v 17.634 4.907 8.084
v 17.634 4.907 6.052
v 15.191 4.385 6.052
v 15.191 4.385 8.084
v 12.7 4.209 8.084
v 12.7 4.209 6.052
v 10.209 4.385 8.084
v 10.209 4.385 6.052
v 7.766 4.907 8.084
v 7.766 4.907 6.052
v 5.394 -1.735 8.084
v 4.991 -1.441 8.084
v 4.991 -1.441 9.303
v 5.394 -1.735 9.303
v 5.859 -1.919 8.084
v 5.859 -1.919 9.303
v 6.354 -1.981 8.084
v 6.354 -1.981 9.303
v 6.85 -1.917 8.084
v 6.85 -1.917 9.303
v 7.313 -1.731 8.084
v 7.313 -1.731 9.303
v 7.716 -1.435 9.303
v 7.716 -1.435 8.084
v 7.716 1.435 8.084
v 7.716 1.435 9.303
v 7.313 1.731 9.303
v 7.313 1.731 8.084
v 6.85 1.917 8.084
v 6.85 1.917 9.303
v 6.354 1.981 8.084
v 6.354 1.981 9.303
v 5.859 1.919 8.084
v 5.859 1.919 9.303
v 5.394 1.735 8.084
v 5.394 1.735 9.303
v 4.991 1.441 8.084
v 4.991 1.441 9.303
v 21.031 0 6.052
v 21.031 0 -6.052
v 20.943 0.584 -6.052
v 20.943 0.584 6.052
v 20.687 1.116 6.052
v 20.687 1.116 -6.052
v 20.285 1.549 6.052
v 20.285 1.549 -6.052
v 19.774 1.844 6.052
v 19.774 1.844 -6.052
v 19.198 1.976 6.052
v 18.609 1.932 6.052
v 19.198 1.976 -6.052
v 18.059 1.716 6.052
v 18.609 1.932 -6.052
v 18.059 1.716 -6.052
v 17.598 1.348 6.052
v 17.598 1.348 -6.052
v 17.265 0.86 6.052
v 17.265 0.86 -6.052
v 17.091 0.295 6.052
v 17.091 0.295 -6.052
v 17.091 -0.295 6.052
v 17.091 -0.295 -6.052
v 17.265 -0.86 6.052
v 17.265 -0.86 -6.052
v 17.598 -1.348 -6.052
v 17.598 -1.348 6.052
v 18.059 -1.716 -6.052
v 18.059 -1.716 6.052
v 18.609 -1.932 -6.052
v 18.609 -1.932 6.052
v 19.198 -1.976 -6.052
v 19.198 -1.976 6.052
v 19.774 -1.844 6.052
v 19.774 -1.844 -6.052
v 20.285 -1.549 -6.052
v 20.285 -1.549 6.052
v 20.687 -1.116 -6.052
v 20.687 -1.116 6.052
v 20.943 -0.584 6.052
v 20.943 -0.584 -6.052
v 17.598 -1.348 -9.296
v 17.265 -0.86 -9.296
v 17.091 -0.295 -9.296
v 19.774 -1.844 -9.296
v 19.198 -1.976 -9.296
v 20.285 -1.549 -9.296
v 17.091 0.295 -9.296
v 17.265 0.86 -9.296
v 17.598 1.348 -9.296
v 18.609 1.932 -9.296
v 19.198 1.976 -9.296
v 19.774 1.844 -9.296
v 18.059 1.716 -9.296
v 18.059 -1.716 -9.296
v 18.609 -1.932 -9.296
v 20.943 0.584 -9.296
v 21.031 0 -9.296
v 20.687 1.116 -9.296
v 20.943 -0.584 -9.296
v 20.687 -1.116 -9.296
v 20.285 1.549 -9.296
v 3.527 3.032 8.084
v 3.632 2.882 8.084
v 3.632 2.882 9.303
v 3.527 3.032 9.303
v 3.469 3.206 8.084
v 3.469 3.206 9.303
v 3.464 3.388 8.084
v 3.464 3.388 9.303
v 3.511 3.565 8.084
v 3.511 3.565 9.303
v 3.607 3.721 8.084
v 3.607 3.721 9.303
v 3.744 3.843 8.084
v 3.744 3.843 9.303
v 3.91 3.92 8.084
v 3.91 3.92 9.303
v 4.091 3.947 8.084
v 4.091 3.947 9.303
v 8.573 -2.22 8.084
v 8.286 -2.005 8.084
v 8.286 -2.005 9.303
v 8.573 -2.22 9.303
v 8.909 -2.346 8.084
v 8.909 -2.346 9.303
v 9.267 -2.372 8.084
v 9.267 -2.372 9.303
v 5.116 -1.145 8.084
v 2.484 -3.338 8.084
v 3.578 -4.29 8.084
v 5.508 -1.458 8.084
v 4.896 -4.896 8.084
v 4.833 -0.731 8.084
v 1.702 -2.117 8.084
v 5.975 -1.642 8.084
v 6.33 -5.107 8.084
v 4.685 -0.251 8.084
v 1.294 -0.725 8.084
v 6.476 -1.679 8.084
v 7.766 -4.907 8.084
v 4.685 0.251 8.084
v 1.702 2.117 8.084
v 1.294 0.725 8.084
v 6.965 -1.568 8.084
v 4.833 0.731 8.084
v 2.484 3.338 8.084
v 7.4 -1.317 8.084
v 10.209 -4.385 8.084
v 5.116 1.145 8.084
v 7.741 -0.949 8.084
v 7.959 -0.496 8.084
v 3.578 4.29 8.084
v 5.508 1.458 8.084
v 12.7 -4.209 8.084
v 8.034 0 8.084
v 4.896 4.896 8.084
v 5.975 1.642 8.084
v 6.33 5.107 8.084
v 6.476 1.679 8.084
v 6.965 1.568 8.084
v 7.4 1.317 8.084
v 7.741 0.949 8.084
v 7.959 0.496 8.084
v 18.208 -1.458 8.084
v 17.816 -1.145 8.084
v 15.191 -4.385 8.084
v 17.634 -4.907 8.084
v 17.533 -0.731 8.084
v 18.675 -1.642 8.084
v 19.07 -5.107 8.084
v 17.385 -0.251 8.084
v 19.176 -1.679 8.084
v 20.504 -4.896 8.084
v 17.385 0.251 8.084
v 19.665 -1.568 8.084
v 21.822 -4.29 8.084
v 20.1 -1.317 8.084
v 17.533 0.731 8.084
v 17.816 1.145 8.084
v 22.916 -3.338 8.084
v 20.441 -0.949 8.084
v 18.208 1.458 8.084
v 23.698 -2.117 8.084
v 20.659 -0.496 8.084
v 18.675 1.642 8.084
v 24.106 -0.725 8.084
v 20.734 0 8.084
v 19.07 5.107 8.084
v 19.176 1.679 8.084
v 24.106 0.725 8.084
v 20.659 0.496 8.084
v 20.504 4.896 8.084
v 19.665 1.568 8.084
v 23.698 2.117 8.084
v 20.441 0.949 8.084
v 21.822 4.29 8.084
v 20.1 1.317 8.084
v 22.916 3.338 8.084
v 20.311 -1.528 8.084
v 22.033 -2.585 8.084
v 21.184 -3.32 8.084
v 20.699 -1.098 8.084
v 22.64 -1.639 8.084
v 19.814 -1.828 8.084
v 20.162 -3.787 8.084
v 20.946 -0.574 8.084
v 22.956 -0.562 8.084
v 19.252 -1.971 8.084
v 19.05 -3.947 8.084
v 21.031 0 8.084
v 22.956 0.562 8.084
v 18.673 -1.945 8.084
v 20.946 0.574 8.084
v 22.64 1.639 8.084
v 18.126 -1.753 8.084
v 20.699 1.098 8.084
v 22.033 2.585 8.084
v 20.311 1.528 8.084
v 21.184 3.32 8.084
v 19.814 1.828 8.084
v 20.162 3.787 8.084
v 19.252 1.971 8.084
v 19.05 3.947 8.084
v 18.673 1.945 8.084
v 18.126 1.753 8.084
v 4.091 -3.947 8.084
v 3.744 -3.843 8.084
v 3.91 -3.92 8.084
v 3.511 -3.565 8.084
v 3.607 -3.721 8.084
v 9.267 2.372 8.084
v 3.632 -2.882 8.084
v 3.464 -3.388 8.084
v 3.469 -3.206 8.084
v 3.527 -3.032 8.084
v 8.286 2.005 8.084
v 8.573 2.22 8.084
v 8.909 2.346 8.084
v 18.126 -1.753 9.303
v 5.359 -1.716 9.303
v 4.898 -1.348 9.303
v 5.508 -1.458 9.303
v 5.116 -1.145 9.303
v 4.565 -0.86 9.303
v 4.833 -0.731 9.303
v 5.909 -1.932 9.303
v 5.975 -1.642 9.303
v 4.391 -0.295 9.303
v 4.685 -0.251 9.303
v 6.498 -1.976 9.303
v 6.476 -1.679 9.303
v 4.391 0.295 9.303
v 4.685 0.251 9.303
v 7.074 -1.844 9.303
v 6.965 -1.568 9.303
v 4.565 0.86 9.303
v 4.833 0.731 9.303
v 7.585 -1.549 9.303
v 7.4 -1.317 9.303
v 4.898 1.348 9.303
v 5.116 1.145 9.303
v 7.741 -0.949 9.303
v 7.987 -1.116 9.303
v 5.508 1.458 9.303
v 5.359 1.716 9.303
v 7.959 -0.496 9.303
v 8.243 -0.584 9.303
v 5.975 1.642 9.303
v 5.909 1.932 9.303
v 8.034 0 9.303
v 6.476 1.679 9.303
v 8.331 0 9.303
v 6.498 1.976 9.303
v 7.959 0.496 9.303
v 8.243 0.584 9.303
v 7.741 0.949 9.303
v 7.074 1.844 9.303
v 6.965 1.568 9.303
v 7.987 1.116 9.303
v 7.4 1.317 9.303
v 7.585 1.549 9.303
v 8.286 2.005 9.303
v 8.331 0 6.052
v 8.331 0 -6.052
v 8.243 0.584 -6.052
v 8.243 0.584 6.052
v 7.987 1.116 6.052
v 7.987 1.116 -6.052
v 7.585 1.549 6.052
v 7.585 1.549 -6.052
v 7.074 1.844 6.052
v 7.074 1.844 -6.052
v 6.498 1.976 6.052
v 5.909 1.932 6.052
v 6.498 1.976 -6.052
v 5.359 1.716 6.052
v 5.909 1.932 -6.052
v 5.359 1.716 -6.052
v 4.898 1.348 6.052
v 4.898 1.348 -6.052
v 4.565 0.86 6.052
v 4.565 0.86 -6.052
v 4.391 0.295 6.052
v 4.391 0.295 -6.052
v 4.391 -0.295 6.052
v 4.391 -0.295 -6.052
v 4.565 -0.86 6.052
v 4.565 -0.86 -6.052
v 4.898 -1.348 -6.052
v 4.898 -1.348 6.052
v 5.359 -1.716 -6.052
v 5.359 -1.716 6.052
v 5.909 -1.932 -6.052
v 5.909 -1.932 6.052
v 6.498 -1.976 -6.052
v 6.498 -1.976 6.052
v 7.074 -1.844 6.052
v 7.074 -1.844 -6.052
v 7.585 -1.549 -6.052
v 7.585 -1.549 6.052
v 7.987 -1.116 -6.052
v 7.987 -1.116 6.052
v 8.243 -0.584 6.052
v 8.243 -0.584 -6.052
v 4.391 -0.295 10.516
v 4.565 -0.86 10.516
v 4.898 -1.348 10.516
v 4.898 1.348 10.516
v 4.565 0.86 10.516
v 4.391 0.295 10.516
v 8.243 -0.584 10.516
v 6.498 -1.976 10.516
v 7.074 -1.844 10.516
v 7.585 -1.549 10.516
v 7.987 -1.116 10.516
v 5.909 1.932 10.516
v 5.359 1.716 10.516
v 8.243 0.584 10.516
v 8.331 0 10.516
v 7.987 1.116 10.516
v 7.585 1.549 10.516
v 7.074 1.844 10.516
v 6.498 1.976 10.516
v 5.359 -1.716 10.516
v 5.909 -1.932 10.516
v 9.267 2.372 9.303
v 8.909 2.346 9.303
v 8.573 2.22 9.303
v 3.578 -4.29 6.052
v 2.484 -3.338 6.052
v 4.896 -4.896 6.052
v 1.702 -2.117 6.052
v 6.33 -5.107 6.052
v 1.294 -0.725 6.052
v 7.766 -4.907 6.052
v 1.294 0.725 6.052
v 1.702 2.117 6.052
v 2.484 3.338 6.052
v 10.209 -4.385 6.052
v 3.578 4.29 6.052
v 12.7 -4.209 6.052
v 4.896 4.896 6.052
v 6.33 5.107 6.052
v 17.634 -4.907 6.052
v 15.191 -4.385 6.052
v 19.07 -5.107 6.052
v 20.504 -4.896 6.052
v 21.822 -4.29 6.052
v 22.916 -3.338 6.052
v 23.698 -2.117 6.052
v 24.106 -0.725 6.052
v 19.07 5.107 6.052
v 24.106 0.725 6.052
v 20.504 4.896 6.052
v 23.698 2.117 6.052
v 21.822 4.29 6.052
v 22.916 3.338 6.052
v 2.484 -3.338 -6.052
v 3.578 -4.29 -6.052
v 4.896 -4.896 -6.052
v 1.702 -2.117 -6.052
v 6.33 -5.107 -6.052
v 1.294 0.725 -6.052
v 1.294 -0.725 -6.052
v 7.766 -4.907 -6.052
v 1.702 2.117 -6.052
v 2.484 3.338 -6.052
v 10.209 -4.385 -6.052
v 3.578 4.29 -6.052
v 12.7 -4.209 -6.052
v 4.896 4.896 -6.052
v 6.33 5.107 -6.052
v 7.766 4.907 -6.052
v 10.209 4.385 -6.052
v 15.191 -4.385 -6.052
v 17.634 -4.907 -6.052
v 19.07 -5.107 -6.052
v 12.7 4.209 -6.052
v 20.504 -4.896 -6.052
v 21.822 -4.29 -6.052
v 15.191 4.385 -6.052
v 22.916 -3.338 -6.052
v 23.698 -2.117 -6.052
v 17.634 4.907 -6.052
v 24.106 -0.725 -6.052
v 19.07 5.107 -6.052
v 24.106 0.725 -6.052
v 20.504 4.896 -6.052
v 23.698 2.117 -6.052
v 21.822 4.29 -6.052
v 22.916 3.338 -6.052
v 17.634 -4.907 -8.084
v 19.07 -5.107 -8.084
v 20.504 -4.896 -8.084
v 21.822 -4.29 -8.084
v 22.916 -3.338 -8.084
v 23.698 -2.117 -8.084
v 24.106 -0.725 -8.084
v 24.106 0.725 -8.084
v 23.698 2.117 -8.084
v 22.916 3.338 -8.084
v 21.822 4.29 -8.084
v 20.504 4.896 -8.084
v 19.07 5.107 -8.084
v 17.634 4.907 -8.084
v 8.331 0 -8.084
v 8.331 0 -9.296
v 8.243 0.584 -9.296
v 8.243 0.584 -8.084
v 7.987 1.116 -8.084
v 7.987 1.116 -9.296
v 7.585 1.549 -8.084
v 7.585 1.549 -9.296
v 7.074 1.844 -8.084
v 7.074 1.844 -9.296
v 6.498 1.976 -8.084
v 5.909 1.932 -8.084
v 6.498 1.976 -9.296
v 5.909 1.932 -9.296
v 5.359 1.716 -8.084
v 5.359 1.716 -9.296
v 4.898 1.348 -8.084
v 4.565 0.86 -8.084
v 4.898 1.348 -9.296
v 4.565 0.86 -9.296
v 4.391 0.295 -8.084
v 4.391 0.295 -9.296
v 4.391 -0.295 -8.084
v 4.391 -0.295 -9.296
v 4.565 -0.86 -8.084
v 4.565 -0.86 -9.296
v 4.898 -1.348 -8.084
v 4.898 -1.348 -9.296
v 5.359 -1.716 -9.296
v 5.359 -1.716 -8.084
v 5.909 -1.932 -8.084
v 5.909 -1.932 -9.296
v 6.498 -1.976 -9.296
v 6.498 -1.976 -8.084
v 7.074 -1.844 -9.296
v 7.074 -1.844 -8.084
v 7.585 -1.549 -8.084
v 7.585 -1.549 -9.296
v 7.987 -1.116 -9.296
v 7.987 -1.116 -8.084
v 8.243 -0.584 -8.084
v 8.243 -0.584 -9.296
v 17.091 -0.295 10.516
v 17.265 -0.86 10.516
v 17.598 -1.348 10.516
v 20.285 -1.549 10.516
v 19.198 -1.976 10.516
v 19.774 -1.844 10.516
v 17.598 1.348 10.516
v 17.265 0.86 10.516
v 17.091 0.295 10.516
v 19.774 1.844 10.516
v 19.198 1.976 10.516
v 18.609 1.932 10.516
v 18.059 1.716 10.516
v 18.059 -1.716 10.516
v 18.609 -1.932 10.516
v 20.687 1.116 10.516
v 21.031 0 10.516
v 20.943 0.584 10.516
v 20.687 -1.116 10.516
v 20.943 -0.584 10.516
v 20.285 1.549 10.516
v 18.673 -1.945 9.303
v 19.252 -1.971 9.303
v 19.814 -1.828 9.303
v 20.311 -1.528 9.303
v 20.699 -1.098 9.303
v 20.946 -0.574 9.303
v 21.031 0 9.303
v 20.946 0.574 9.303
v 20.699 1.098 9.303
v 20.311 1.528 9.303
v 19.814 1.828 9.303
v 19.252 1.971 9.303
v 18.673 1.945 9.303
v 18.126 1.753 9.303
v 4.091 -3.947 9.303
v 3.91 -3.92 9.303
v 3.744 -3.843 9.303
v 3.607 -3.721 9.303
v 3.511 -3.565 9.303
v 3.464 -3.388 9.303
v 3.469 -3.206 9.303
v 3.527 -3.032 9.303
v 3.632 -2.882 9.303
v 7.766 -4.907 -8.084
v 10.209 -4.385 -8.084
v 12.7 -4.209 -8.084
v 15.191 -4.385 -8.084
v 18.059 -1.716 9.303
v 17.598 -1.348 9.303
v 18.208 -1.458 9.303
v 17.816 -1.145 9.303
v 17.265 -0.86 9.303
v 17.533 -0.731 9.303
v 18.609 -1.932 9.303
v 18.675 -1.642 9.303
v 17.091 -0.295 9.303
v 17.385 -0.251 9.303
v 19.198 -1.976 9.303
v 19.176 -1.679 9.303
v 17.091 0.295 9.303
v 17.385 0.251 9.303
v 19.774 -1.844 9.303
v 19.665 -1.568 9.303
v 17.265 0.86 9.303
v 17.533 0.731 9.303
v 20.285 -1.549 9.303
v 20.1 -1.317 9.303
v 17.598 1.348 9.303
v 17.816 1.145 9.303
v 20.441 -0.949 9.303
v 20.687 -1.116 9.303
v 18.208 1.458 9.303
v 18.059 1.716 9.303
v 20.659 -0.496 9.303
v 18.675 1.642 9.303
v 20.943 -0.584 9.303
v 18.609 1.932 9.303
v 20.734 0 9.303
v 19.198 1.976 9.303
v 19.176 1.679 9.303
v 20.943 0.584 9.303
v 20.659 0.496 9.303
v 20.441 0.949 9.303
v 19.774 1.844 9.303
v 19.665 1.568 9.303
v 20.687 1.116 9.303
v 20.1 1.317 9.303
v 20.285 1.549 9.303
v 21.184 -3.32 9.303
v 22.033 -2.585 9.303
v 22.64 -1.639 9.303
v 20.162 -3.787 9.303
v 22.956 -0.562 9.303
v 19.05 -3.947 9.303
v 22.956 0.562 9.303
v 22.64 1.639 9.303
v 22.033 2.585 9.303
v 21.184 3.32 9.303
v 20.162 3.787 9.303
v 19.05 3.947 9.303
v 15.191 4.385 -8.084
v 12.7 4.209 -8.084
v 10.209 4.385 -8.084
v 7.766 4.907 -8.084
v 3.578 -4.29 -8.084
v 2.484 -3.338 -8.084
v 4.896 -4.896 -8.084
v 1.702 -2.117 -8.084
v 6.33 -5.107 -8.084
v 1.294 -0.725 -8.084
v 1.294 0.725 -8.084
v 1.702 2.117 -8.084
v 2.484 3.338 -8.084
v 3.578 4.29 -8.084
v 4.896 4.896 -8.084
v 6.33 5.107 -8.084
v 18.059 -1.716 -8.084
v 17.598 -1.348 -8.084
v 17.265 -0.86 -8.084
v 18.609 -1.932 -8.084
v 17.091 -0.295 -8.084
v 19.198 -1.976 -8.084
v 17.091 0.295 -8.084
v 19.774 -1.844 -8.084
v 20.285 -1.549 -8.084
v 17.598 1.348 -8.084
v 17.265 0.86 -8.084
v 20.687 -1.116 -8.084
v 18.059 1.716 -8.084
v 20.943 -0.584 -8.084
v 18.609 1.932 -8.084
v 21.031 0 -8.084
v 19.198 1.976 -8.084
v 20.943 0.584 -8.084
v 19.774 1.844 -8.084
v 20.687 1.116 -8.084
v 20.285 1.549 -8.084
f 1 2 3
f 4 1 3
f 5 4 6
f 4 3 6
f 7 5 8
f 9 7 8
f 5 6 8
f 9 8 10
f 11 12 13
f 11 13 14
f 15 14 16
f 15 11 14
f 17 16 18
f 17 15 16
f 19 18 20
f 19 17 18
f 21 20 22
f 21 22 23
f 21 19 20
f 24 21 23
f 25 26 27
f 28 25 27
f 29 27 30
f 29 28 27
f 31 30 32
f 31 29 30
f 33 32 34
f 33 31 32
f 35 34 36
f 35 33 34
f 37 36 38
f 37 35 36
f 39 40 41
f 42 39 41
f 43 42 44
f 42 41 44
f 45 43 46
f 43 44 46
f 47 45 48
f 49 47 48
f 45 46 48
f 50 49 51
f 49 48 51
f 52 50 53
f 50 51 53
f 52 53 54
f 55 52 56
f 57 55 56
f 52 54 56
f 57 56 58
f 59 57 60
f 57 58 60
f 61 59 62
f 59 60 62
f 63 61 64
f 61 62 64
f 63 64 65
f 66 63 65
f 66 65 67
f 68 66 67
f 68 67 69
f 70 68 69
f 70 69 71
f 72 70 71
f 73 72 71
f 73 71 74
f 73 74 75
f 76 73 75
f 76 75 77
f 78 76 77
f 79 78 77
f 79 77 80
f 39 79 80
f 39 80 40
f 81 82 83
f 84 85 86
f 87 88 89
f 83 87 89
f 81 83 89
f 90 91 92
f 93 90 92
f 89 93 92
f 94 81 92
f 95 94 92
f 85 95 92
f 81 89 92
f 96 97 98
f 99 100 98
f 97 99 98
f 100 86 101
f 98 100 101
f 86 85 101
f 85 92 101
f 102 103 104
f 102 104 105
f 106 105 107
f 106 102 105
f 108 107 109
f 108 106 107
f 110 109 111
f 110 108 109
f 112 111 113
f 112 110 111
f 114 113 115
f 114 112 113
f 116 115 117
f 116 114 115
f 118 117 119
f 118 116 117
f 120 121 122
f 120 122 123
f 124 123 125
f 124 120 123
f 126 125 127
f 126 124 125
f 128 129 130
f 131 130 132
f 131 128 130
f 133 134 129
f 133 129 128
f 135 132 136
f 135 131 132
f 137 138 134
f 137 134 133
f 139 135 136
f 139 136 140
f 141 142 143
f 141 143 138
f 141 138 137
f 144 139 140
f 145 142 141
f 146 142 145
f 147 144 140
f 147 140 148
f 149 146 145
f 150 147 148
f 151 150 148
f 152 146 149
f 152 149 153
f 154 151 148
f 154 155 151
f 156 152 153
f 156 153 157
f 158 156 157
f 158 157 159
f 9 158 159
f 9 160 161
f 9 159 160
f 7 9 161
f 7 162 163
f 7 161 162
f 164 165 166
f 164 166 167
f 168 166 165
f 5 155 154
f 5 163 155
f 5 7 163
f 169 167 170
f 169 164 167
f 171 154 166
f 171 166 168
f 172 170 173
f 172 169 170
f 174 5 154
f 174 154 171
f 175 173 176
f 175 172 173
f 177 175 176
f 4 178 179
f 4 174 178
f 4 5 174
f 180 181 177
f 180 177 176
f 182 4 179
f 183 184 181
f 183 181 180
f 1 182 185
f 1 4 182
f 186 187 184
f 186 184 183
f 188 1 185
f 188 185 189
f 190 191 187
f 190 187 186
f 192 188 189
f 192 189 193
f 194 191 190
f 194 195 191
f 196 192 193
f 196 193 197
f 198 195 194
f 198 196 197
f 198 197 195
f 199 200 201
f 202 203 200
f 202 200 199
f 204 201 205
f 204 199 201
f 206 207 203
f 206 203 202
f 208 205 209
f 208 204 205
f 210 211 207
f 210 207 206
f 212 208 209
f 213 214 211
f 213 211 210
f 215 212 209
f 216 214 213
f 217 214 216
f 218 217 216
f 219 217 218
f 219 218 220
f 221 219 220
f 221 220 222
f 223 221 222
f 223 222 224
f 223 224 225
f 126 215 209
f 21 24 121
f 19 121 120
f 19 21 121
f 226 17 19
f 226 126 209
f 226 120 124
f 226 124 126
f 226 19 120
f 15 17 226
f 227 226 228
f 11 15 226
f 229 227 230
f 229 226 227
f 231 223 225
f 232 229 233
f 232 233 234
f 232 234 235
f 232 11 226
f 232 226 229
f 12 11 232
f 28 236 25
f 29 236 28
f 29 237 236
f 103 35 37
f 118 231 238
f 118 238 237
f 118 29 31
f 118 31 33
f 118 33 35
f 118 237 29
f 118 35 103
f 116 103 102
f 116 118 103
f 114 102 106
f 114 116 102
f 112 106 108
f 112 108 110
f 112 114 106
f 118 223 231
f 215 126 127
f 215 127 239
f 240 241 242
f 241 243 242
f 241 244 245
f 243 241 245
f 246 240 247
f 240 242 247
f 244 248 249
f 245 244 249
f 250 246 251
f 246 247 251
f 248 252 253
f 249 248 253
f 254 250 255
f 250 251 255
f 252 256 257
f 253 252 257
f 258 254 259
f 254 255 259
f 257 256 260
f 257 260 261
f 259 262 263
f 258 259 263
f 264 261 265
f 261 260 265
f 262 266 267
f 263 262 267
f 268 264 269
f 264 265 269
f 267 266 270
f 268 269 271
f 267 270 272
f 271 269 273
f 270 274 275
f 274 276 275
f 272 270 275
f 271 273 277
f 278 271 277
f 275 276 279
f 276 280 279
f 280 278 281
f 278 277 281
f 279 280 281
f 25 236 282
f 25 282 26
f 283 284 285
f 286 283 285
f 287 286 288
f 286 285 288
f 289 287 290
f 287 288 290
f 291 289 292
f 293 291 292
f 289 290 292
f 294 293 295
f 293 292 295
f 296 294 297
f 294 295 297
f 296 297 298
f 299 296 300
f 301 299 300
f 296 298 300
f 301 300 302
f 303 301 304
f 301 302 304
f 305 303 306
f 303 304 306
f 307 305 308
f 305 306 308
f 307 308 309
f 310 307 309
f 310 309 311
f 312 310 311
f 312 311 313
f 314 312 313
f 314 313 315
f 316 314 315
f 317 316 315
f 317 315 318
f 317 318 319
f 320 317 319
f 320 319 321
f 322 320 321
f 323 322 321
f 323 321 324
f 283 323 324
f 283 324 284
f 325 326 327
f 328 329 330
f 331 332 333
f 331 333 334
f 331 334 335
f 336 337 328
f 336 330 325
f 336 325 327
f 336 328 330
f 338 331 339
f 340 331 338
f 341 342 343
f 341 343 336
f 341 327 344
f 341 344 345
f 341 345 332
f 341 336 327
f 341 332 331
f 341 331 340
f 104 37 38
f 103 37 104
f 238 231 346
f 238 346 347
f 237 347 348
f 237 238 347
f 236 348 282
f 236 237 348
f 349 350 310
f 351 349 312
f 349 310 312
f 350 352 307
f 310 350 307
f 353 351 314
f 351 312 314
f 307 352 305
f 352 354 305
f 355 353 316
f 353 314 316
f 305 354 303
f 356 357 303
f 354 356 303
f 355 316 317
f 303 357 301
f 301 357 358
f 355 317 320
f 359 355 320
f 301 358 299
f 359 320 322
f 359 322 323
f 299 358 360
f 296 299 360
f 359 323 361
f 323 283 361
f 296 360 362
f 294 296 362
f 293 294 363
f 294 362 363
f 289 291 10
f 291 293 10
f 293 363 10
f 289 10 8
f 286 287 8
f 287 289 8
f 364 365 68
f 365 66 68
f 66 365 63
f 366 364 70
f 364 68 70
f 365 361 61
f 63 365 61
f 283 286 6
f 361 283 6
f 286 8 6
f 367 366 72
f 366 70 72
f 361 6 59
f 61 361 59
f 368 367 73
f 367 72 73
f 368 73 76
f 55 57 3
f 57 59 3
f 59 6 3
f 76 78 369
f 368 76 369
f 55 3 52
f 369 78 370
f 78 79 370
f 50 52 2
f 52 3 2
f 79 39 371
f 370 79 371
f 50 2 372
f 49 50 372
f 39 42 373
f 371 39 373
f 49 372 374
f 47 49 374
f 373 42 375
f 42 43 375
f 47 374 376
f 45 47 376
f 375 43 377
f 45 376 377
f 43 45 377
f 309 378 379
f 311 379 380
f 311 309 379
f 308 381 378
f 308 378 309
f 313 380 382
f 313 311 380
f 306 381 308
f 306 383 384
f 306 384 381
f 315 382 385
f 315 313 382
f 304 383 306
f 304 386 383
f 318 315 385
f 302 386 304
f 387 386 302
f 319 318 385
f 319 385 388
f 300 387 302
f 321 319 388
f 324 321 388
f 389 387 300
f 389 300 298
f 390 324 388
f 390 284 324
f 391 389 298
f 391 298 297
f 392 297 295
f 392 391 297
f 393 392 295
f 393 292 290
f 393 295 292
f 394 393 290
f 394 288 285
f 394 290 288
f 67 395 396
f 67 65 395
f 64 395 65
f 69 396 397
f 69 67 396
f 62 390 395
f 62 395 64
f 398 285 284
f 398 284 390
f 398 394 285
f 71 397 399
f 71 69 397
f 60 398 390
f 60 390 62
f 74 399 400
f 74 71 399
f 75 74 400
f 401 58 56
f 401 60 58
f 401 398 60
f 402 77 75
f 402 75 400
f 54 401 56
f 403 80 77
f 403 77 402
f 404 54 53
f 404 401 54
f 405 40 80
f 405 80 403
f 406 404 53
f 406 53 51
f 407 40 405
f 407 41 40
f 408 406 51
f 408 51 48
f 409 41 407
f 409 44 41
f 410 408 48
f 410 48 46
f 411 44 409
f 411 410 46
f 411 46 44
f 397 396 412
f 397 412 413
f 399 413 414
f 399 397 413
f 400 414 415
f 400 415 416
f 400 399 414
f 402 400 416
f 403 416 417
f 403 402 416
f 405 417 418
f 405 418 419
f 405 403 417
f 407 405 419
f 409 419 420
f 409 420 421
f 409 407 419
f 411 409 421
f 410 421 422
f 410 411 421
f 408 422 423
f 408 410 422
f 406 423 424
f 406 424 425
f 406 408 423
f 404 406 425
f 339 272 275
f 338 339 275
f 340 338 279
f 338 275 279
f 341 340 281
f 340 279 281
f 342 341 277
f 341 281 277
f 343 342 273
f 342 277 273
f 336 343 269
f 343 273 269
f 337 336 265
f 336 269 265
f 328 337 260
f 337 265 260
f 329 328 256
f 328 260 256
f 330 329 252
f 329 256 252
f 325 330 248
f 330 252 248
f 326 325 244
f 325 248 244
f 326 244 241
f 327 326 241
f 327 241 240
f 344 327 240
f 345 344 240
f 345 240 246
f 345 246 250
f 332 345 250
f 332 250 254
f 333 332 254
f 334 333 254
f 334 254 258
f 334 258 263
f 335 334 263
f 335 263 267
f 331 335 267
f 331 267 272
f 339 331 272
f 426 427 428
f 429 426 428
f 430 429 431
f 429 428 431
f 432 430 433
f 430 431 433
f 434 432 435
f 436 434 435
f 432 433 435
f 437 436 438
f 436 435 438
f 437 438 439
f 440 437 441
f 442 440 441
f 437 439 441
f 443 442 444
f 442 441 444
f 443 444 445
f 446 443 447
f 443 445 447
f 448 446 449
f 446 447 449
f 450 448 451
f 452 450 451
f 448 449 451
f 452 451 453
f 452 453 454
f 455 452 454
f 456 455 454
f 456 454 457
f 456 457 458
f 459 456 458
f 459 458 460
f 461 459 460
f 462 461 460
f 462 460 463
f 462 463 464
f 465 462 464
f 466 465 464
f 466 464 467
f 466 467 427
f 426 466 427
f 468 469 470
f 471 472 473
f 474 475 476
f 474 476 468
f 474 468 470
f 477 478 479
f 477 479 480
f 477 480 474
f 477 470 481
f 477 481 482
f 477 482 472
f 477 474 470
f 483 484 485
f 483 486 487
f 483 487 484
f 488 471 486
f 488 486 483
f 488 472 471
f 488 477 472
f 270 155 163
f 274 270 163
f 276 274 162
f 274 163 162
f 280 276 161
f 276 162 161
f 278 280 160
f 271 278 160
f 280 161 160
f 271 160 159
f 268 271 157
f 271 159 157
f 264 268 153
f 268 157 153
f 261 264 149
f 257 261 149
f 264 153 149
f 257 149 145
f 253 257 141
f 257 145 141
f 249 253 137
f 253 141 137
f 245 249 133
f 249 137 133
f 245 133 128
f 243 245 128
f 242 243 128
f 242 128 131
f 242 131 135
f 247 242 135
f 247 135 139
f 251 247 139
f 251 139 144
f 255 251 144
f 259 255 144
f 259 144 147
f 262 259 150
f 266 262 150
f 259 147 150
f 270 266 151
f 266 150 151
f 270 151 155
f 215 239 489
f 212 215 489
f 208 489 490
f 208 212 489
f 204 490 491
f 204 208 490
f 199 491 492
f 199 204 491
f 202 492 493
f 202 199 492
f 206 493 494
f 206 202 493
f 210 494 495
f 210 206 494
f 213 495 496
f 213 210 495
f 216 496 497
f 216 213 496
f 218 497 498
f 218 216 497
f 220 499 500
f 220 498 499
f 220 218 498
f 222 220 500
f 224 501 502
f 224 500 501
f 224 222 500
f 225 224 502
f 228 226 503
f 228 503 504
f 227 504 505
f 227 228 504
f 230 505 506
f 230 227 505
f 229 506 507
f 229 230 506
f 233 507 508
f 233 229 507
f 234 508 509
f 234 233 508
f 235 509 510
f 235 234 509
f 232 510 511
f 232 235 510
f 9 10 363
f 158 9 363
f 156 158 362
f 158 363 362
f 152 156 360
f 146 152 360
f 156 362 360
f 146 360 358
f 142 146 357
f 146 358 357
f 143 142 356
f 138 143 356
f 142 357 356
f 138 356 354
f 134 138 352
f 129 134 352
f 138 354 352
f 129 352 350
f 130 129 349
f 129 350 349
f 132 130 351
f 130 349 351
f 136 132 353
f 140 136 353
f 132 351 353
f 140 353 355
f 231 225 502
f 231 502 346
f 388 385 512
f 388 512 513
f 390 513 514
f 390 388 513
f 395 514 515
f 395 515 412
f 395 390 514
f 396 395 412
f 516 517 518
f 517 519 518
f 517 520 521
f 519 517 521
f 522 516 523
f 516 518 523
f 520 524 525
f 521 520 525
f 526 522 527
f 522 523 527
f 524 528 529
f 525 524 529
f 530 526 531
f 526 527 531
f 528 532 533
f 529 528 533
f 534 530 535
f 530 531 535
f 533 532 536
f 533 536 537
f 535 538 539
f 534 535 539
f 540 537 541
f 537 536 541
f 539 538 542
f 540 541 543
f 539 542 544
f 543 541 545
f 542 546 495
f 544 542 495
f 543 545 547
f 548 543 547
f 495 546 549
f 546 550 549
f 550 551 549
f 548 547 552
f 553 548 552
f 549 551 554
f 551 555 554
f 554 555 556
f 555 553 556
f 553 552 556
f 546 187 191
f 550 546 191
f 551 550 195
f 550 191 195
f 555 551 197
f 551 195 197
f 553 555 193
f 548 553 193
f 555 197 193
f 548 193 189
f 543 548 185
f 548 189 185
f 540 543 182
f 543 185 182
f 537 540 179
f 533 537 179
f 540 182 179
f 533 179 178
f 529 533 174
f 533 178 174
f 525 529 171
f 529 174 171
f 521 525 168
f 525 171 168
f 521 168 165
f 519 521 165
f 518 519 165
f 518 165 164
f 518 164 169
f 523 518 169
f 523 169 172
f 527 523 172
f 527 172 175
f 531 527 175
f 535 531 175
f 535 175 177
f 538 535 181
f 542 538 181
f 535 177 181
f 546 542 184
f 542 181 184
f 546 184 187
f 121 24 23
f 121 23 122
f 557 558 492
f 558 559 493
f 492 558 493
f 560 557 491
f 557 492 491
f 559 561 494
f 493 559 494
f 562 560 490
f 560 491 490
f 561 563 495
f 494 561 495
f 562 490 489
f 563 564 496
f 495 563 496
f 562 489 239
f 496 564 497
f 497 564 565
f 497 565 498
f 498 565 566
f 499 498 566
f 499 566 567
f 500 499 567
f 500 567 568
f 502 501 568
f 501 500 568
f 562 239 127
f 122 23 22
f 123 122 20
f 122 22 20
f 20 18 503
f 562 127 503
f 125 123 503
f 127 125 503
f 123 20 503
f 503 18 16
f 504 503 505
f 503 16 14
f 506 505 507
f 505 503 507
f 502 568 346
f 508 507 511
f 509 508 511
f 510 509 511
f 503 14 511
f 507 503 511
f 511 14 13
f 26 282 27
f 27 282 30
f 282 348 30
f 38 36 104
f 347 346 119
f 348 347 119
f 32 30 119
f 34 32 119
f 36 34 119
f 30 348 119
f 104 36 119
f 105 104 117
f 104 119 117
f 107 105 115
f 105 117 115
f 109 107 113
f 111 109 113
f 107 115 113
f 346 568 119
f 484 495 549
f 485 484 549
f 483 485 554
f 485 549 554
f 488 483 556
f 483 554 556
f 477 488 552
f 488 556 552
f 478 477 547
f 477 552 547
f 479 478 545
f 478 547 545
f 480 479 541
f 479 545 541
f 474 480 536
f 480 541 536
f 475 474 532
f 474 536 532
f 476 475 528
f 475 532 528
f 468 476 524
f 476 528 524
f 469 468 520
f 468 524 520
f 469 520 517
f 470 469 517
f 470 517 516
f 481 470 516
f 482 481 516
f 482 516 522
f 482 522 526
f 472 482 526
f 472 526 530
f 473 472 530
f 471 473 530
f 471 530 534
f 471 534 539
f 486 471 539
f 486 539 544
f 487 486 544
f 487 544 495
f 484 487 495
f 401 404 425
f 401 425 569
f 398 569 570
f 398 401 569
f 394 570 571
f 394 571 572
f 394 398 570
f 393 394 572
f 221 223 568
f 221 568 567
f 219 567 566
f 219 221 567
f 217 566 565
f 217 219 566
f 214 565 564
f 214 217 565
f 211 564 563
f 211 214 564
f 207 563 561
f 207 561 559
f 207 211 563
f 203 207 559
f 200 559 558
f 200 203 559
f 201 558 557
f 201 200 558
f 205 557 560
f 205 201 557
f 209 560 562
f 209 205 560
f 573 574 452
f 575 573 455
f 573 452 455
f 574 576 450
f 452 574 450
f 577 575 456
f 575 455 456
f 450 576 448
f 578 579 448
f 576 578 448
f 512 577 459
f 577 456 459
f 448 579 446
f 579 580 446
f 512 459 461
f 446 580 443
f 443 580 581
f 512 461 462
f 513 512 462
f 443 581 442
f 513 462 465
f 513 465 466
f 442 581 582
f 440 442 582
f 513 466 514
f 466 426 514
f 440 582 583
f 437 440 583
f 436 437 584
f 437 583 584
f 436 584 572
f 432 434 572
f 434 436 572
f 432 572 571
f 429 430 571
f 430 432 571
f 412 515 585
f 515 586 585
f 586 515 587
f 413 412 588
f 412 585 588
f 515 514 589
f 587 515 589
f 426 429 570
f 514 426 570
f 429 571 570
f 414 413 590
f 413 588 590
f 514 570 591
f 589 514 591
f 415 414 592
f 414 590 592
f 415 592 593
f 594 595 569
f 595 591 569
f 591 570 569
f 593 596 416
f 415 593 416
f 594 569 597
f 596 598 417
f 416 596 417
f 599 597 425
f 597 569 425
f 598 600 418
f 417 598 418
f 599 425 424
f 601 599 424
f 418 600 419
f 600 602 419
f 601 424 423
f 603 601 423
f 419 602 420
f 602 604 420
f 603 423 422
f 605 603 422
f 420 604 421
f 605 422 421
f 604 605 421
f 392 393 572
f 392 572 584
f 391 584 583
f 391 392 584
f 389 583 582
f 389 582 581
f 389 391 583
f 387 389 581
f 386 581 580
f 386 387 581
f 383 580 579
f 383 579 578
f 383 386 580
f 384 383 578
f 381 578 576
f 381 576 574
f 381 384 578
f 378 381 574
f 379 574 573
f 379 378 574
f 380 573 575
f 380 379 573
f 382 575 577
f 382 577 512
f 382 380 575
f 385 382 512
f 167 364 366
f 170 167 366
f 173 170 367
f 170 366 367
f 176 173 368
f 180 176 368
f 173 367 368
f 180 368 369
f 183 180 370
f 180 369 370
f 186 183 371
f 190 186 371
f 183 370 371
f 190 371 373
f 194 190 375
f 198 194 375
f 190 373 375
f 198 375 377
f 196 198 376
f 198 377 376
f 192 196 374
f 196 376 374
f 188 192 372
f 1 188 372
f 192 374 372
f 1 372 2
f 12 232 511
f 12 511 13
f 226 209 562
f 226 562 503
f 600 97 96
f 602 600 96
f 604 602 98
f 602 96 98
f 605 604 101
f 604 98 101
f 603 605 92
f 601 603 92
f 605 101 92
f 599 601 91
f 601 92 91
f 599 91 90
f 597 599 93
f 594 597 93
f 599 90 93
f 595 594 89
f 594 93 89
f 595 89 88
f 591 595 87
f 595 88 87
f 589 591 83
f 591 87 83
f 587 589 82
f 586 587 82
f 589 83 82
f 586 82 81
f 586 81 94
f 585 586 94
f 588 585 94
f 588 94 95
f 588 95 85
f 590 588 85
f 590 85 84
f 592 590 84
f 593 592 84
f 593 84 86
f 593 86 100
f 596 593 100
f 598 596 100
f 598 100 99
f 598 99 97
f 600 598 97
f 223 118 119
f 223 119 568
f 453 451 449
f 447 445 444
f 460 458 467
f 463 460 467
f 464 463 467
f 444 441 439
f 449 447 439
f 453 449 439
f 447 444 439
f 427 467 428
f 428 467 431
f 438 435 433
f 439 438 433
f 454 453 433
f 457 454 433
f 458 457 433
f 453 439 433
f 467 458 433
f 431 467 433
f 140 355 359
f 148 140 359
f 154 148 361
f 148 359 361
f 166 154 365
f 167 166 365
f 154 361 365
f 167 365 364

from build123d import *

# Parameters (mm, degrees)
SKETCH4_R                  = 3.9624
SKETCH4_R_2                = 2.0066
BOSS_EXTRUDE1_DEPTH        = 3.96875
SKETCH5_R                  = 1.9812
BOSS_EXTRUDE2_DEPTH        = 2.032
LPATTERN1_COUNT            = 2
LPATTERN1_PITCH            = 12.7
SKETCH7_R                  = 1.9812
BOSS_EXTRUDE3_DEPTH        = 2.032
MIRROR1_START              = 6.05155
MIRROR1_OUTLINE_R          = 1.9812
MIRROR1_DEPTH              = 2.032
BOSS_EXTRUDE4_DEPTH        = 10.5156
BOSS_EXTRUDE4_DEPTH_BACK   = 9.2964
SKETCH8_R                  = 1.9812
BOSS_EXTRUDE4_2_DEPTH      = 10.5156
BOSS_EXTRUDE4_2_DEPTH_BACK = 9.2964
BOSS_EXTRUDE5_DEPTH        = 1.2192
SKETCH12_R                 = 1.9812
SKETCH12_R_2               = 1.68402
CUT_EXTRUDE1_DEPTH         = 1.2192


# Read off the part's stored shape, not the designer's step: Mirror1
with BuildPart() as part:
    # Sketch4 → Boss-Extrude1 (new, symmetric)
    with BuildSketch(Plane.XY):
        with Locations((6.35, 0)):
            Circle(SKETCH4_R)
        with Locations((6.35, 0)):
            Circle(SKETCH4_R_2, mode=Mode.SUBTRACT)
    extrude(amount=BOSS_EXTRUDE1_DEPTH, both=True)


with BuildPart() as body_2:
    # Sketch5 → Boss-Extrude2 (new body)
    with BuildSketch(Plane.XY.offset(3.96875)):
        with BuildLine():
            ThreePointArc((-4.787931893, 5.589740462), (-12.1539, 0), (-4.787931893, -5.589740462))
            ThreePointArc((-4.787931893, -5.589740462), (0, -4.933315), (4.787931893, -5.589740462))
            ThreePointArc((4.787931893, -5.589740462), (12.1539, 0), (4.787931893, 5.589740462))
            ThreePointArc((4.787931893, 5.589740462), (0, 4.933315), (-4.787931893, 5.589740462))
        make_face()
        with Locations((-6.35, 0)):
            Circle(SKETCH5_R, mode=Mode.SUBTRACT)
        with Locations((6.35, 0)):
            Circle(SKETCH5_R, mode=Mode.SUBTRACT)
    extrude(amount=BOSS_EXTRUDE2_DEPTH)


with BuildPart() as lpattern1_1:
    # LPattern1: pattern copy
    add(part.part.moved(Location(Vector(1, 0, 0) * (1 * LPATTERN1_PITCH))))


with BuildPart() as body_4:
    # Sketch7 → Boss-Extrude3 (new body)
    with BuildSketch(Plane.XY.offset(-6.05155)):
        with BuildLine():
            ThreePointArc((7.766432158, 4.907095024), (1.242568, 0), (7.766432158, -4.907095024))
            ThreePointArc((7.766432158, -4.907095024), (12.7, -4.209302295), (17.633567842, -4.907095024))
            ThreePointArc((17.633567842, -4.907095024), (24.157432, 0), (17.633567842, 4.907095024))
            ThreePointArc((17.633567842, 4.907095024), (12.7, 4.209302295), (7.766432158, 4.907095024))
        make_face()
        with Locations((6.35, 0)):
            Circle(SKETCH7_R, mode=Mode.SUBTRACT)
        with Locations((19.05, 0)):
            Circle(SKETCH7_R, mode=Mode.SUBTRACT)
    extrude(amount=-BOSS_EXTRUDE3_DEPTH)


with BuildPart() as body_5:
    # Mirror1 outline → Mirror1 (new body)
    with BuildSketch(Plane.XY.offset(MIRROR1_START)):
        with BuildLine():
            ThreePointArc((17.633567842, -4.907095024), (24.157432, 0), (17.633567842, 4.907095024))
            ThreePointArc((17.633567842, 4.907095024), (12.7, 4.209302295), (7.766432158, 4.907095024))
            ThreePointArc((7.766432158, 4.907095024), (1.242568, 0), (7.766432158, -4.907095024))
            ThreePointArc((7.766432158, -4.907095024), (12.7, -4.209302295), (17.633567842, -4.907095024))
        make_face()
        with Locations((6.35, 0)):
            Circle(MIRROR1_OUTLINE_R, mode=Mode.SUBTRACT)
        with Locations((19.05, 0)):
            Circle(MIRROR1_OUTLINE_R, mode=Mode.SUBTRACT)
    extrude(amount=MIRROR1_DEPTH)


with BuildPart() as body_3:
    # Sketch8 → Boss-Extrude4 (new, two sides: drawn at the far end of the back side and taken through both)
    with BuildSketch(Plane.XY.offset(-BOSS_EXTRUDE4_DEPTH_BACK)):
        with Locations((6.35, 0)):
            Circle(SKETCH8_R)
    extrude(amount=BOSS_EXTRUDE4_DEPTH + BOSS_EXTRUDE4_DEPTH_BACK)


with BuildPart() as body_4_2:
    # Sketch8 → Boss-Extrude4 2 (new, two sides: drawn at the far end of the back side and taken through both)
    with BuildSketch(Plane.XY.offset(-BOSS_EXTRUDE4_2_DEPTH_BACK)):
        with Locations((19.05, 0)):
            Circle(SKETCH8_R)
    extrude(amount=BOSS_EXTRUDE4_2_DEPTH + BOSS_EXTRUDE4_2_DEPTH_BACK)


with BuildPart() as body_5_2:
    # Sketch10 → Boss-Extrude5 (new body)
    with BuildSketch(Plane.XY.offset(8.08355)):
        with BuildLine():
            Line((19.05, -3.946652), (4.091050732, -3.946652))
            ThreePointArc((4.091050732, -3.946652), (3.511202451, -3.565299839), (3.631666978, -2.881822116))
            Line((3.631666978, -2.881822116), (5.194473642, -1.225023345))
            ThreePointArc((5.194473642, -1.225023345), (6.35, -1.68402), (7.505526358, -1.225023345))
            Line((7.505526358, -1.225023345), (8.285872934, -2.005369922))
            ThreePointArc((8.285872934, -2.005369922), (8.73664223, -2.295314476), (9.267062878, -2.37222181))
            Line((9.267062878, -2.37222181), (19.167471297, -1.679917812))
            ThreePointArc((19.167471297, -1.679917812), (20.73402, 0), (19.167471297, 1.679917812))
            Line((19.167471297, 1.679917812), (9.267062878, 2.37222181))
            ThreePointArc((9.267062878, 2.37222181), (8.73664223, 2.295314476), (8.285872934, 2.005369922))
            Line((8.285872934, 2.005369922), (7.505526358, 1.225023345))
            ThreePointArc((7.505526358, 1.225023345), (6.35, 1.68402), (5.194473642, 1.225023345))
            Line((5.194473642, 1.225023345), (3.631666978, 2.881822116))
            ThreePointArc((3.631666978, 2.881822116), (3.511202451, 3.565299839), (4.091050732, 3.946652))
            Line((4.091050732, 3.946652), (19.05, 3.946652))
            ThreePointArc((19.05, 3.946652), (22.996652, 0), (19.05, -3.946652))
        make_face()
    extrude(amount=BOSS_EXTRUDE5_DEPTH)


with BuildPart() as cut_extrude1_tool:
    # Sketch12 → Cut-Extrude1 (new body)
    # profile 1 of 2: a face of its own
    with BuildSketch(Plane.XY.offset(8.08355)):
        with Locations((6.35, 0)):
            Circle(SKETCH12_R)
        with Locations((6.35, 0)):
            Circle(SKETCH12_R_2, mode=Mode.SUBTRACT)
    # profile 2 of 2: a face of its own
    with BuildSketch(Plane.XY.offset(8.08355)):
        with Locations((19.05, 0)):
            Circle(SKETCH12_R)
        with Locations((19.05, 0)):
            Circle(SKETCH12_R_2, mode=Mode.SUBTRACT)
    extrude(amount=CUT_EXTRUDE1_DEPTH)


with BuildPart() as body_3_1:
    add(body_3.part)

    # Cut-Extrude1: cut by cut_extrude1_tool
    add(cut_extrude1_tool.part, mode=Mode.SUBTRACT)


with BuildPart() as body_4_2_1:
    add(body_4_2.part)

    # Cut-Extrude1: cut by cut_extrude1_tool
    add(cut_extrude1_tool.part, mode=Mode.SUBTRACT)


with BuildPart() as body_5_2_1:
    add(body_5_2.part)

    # Cut-Extrude1: cut by cut_extrude1_tool
    add(cut_extrude1_tool.part, mode=Mode.SUBTRACT)


with BuildPart() as body_4_1:
    add(body_4.part)

    # Combine3: union body 5, body 4 2, body 3
    add(body_5.part)
    add(body_4_2_1.part)
    add(body_3_1.part)


solid = Compound([body_5_2_1.part, body_4_1.part])
